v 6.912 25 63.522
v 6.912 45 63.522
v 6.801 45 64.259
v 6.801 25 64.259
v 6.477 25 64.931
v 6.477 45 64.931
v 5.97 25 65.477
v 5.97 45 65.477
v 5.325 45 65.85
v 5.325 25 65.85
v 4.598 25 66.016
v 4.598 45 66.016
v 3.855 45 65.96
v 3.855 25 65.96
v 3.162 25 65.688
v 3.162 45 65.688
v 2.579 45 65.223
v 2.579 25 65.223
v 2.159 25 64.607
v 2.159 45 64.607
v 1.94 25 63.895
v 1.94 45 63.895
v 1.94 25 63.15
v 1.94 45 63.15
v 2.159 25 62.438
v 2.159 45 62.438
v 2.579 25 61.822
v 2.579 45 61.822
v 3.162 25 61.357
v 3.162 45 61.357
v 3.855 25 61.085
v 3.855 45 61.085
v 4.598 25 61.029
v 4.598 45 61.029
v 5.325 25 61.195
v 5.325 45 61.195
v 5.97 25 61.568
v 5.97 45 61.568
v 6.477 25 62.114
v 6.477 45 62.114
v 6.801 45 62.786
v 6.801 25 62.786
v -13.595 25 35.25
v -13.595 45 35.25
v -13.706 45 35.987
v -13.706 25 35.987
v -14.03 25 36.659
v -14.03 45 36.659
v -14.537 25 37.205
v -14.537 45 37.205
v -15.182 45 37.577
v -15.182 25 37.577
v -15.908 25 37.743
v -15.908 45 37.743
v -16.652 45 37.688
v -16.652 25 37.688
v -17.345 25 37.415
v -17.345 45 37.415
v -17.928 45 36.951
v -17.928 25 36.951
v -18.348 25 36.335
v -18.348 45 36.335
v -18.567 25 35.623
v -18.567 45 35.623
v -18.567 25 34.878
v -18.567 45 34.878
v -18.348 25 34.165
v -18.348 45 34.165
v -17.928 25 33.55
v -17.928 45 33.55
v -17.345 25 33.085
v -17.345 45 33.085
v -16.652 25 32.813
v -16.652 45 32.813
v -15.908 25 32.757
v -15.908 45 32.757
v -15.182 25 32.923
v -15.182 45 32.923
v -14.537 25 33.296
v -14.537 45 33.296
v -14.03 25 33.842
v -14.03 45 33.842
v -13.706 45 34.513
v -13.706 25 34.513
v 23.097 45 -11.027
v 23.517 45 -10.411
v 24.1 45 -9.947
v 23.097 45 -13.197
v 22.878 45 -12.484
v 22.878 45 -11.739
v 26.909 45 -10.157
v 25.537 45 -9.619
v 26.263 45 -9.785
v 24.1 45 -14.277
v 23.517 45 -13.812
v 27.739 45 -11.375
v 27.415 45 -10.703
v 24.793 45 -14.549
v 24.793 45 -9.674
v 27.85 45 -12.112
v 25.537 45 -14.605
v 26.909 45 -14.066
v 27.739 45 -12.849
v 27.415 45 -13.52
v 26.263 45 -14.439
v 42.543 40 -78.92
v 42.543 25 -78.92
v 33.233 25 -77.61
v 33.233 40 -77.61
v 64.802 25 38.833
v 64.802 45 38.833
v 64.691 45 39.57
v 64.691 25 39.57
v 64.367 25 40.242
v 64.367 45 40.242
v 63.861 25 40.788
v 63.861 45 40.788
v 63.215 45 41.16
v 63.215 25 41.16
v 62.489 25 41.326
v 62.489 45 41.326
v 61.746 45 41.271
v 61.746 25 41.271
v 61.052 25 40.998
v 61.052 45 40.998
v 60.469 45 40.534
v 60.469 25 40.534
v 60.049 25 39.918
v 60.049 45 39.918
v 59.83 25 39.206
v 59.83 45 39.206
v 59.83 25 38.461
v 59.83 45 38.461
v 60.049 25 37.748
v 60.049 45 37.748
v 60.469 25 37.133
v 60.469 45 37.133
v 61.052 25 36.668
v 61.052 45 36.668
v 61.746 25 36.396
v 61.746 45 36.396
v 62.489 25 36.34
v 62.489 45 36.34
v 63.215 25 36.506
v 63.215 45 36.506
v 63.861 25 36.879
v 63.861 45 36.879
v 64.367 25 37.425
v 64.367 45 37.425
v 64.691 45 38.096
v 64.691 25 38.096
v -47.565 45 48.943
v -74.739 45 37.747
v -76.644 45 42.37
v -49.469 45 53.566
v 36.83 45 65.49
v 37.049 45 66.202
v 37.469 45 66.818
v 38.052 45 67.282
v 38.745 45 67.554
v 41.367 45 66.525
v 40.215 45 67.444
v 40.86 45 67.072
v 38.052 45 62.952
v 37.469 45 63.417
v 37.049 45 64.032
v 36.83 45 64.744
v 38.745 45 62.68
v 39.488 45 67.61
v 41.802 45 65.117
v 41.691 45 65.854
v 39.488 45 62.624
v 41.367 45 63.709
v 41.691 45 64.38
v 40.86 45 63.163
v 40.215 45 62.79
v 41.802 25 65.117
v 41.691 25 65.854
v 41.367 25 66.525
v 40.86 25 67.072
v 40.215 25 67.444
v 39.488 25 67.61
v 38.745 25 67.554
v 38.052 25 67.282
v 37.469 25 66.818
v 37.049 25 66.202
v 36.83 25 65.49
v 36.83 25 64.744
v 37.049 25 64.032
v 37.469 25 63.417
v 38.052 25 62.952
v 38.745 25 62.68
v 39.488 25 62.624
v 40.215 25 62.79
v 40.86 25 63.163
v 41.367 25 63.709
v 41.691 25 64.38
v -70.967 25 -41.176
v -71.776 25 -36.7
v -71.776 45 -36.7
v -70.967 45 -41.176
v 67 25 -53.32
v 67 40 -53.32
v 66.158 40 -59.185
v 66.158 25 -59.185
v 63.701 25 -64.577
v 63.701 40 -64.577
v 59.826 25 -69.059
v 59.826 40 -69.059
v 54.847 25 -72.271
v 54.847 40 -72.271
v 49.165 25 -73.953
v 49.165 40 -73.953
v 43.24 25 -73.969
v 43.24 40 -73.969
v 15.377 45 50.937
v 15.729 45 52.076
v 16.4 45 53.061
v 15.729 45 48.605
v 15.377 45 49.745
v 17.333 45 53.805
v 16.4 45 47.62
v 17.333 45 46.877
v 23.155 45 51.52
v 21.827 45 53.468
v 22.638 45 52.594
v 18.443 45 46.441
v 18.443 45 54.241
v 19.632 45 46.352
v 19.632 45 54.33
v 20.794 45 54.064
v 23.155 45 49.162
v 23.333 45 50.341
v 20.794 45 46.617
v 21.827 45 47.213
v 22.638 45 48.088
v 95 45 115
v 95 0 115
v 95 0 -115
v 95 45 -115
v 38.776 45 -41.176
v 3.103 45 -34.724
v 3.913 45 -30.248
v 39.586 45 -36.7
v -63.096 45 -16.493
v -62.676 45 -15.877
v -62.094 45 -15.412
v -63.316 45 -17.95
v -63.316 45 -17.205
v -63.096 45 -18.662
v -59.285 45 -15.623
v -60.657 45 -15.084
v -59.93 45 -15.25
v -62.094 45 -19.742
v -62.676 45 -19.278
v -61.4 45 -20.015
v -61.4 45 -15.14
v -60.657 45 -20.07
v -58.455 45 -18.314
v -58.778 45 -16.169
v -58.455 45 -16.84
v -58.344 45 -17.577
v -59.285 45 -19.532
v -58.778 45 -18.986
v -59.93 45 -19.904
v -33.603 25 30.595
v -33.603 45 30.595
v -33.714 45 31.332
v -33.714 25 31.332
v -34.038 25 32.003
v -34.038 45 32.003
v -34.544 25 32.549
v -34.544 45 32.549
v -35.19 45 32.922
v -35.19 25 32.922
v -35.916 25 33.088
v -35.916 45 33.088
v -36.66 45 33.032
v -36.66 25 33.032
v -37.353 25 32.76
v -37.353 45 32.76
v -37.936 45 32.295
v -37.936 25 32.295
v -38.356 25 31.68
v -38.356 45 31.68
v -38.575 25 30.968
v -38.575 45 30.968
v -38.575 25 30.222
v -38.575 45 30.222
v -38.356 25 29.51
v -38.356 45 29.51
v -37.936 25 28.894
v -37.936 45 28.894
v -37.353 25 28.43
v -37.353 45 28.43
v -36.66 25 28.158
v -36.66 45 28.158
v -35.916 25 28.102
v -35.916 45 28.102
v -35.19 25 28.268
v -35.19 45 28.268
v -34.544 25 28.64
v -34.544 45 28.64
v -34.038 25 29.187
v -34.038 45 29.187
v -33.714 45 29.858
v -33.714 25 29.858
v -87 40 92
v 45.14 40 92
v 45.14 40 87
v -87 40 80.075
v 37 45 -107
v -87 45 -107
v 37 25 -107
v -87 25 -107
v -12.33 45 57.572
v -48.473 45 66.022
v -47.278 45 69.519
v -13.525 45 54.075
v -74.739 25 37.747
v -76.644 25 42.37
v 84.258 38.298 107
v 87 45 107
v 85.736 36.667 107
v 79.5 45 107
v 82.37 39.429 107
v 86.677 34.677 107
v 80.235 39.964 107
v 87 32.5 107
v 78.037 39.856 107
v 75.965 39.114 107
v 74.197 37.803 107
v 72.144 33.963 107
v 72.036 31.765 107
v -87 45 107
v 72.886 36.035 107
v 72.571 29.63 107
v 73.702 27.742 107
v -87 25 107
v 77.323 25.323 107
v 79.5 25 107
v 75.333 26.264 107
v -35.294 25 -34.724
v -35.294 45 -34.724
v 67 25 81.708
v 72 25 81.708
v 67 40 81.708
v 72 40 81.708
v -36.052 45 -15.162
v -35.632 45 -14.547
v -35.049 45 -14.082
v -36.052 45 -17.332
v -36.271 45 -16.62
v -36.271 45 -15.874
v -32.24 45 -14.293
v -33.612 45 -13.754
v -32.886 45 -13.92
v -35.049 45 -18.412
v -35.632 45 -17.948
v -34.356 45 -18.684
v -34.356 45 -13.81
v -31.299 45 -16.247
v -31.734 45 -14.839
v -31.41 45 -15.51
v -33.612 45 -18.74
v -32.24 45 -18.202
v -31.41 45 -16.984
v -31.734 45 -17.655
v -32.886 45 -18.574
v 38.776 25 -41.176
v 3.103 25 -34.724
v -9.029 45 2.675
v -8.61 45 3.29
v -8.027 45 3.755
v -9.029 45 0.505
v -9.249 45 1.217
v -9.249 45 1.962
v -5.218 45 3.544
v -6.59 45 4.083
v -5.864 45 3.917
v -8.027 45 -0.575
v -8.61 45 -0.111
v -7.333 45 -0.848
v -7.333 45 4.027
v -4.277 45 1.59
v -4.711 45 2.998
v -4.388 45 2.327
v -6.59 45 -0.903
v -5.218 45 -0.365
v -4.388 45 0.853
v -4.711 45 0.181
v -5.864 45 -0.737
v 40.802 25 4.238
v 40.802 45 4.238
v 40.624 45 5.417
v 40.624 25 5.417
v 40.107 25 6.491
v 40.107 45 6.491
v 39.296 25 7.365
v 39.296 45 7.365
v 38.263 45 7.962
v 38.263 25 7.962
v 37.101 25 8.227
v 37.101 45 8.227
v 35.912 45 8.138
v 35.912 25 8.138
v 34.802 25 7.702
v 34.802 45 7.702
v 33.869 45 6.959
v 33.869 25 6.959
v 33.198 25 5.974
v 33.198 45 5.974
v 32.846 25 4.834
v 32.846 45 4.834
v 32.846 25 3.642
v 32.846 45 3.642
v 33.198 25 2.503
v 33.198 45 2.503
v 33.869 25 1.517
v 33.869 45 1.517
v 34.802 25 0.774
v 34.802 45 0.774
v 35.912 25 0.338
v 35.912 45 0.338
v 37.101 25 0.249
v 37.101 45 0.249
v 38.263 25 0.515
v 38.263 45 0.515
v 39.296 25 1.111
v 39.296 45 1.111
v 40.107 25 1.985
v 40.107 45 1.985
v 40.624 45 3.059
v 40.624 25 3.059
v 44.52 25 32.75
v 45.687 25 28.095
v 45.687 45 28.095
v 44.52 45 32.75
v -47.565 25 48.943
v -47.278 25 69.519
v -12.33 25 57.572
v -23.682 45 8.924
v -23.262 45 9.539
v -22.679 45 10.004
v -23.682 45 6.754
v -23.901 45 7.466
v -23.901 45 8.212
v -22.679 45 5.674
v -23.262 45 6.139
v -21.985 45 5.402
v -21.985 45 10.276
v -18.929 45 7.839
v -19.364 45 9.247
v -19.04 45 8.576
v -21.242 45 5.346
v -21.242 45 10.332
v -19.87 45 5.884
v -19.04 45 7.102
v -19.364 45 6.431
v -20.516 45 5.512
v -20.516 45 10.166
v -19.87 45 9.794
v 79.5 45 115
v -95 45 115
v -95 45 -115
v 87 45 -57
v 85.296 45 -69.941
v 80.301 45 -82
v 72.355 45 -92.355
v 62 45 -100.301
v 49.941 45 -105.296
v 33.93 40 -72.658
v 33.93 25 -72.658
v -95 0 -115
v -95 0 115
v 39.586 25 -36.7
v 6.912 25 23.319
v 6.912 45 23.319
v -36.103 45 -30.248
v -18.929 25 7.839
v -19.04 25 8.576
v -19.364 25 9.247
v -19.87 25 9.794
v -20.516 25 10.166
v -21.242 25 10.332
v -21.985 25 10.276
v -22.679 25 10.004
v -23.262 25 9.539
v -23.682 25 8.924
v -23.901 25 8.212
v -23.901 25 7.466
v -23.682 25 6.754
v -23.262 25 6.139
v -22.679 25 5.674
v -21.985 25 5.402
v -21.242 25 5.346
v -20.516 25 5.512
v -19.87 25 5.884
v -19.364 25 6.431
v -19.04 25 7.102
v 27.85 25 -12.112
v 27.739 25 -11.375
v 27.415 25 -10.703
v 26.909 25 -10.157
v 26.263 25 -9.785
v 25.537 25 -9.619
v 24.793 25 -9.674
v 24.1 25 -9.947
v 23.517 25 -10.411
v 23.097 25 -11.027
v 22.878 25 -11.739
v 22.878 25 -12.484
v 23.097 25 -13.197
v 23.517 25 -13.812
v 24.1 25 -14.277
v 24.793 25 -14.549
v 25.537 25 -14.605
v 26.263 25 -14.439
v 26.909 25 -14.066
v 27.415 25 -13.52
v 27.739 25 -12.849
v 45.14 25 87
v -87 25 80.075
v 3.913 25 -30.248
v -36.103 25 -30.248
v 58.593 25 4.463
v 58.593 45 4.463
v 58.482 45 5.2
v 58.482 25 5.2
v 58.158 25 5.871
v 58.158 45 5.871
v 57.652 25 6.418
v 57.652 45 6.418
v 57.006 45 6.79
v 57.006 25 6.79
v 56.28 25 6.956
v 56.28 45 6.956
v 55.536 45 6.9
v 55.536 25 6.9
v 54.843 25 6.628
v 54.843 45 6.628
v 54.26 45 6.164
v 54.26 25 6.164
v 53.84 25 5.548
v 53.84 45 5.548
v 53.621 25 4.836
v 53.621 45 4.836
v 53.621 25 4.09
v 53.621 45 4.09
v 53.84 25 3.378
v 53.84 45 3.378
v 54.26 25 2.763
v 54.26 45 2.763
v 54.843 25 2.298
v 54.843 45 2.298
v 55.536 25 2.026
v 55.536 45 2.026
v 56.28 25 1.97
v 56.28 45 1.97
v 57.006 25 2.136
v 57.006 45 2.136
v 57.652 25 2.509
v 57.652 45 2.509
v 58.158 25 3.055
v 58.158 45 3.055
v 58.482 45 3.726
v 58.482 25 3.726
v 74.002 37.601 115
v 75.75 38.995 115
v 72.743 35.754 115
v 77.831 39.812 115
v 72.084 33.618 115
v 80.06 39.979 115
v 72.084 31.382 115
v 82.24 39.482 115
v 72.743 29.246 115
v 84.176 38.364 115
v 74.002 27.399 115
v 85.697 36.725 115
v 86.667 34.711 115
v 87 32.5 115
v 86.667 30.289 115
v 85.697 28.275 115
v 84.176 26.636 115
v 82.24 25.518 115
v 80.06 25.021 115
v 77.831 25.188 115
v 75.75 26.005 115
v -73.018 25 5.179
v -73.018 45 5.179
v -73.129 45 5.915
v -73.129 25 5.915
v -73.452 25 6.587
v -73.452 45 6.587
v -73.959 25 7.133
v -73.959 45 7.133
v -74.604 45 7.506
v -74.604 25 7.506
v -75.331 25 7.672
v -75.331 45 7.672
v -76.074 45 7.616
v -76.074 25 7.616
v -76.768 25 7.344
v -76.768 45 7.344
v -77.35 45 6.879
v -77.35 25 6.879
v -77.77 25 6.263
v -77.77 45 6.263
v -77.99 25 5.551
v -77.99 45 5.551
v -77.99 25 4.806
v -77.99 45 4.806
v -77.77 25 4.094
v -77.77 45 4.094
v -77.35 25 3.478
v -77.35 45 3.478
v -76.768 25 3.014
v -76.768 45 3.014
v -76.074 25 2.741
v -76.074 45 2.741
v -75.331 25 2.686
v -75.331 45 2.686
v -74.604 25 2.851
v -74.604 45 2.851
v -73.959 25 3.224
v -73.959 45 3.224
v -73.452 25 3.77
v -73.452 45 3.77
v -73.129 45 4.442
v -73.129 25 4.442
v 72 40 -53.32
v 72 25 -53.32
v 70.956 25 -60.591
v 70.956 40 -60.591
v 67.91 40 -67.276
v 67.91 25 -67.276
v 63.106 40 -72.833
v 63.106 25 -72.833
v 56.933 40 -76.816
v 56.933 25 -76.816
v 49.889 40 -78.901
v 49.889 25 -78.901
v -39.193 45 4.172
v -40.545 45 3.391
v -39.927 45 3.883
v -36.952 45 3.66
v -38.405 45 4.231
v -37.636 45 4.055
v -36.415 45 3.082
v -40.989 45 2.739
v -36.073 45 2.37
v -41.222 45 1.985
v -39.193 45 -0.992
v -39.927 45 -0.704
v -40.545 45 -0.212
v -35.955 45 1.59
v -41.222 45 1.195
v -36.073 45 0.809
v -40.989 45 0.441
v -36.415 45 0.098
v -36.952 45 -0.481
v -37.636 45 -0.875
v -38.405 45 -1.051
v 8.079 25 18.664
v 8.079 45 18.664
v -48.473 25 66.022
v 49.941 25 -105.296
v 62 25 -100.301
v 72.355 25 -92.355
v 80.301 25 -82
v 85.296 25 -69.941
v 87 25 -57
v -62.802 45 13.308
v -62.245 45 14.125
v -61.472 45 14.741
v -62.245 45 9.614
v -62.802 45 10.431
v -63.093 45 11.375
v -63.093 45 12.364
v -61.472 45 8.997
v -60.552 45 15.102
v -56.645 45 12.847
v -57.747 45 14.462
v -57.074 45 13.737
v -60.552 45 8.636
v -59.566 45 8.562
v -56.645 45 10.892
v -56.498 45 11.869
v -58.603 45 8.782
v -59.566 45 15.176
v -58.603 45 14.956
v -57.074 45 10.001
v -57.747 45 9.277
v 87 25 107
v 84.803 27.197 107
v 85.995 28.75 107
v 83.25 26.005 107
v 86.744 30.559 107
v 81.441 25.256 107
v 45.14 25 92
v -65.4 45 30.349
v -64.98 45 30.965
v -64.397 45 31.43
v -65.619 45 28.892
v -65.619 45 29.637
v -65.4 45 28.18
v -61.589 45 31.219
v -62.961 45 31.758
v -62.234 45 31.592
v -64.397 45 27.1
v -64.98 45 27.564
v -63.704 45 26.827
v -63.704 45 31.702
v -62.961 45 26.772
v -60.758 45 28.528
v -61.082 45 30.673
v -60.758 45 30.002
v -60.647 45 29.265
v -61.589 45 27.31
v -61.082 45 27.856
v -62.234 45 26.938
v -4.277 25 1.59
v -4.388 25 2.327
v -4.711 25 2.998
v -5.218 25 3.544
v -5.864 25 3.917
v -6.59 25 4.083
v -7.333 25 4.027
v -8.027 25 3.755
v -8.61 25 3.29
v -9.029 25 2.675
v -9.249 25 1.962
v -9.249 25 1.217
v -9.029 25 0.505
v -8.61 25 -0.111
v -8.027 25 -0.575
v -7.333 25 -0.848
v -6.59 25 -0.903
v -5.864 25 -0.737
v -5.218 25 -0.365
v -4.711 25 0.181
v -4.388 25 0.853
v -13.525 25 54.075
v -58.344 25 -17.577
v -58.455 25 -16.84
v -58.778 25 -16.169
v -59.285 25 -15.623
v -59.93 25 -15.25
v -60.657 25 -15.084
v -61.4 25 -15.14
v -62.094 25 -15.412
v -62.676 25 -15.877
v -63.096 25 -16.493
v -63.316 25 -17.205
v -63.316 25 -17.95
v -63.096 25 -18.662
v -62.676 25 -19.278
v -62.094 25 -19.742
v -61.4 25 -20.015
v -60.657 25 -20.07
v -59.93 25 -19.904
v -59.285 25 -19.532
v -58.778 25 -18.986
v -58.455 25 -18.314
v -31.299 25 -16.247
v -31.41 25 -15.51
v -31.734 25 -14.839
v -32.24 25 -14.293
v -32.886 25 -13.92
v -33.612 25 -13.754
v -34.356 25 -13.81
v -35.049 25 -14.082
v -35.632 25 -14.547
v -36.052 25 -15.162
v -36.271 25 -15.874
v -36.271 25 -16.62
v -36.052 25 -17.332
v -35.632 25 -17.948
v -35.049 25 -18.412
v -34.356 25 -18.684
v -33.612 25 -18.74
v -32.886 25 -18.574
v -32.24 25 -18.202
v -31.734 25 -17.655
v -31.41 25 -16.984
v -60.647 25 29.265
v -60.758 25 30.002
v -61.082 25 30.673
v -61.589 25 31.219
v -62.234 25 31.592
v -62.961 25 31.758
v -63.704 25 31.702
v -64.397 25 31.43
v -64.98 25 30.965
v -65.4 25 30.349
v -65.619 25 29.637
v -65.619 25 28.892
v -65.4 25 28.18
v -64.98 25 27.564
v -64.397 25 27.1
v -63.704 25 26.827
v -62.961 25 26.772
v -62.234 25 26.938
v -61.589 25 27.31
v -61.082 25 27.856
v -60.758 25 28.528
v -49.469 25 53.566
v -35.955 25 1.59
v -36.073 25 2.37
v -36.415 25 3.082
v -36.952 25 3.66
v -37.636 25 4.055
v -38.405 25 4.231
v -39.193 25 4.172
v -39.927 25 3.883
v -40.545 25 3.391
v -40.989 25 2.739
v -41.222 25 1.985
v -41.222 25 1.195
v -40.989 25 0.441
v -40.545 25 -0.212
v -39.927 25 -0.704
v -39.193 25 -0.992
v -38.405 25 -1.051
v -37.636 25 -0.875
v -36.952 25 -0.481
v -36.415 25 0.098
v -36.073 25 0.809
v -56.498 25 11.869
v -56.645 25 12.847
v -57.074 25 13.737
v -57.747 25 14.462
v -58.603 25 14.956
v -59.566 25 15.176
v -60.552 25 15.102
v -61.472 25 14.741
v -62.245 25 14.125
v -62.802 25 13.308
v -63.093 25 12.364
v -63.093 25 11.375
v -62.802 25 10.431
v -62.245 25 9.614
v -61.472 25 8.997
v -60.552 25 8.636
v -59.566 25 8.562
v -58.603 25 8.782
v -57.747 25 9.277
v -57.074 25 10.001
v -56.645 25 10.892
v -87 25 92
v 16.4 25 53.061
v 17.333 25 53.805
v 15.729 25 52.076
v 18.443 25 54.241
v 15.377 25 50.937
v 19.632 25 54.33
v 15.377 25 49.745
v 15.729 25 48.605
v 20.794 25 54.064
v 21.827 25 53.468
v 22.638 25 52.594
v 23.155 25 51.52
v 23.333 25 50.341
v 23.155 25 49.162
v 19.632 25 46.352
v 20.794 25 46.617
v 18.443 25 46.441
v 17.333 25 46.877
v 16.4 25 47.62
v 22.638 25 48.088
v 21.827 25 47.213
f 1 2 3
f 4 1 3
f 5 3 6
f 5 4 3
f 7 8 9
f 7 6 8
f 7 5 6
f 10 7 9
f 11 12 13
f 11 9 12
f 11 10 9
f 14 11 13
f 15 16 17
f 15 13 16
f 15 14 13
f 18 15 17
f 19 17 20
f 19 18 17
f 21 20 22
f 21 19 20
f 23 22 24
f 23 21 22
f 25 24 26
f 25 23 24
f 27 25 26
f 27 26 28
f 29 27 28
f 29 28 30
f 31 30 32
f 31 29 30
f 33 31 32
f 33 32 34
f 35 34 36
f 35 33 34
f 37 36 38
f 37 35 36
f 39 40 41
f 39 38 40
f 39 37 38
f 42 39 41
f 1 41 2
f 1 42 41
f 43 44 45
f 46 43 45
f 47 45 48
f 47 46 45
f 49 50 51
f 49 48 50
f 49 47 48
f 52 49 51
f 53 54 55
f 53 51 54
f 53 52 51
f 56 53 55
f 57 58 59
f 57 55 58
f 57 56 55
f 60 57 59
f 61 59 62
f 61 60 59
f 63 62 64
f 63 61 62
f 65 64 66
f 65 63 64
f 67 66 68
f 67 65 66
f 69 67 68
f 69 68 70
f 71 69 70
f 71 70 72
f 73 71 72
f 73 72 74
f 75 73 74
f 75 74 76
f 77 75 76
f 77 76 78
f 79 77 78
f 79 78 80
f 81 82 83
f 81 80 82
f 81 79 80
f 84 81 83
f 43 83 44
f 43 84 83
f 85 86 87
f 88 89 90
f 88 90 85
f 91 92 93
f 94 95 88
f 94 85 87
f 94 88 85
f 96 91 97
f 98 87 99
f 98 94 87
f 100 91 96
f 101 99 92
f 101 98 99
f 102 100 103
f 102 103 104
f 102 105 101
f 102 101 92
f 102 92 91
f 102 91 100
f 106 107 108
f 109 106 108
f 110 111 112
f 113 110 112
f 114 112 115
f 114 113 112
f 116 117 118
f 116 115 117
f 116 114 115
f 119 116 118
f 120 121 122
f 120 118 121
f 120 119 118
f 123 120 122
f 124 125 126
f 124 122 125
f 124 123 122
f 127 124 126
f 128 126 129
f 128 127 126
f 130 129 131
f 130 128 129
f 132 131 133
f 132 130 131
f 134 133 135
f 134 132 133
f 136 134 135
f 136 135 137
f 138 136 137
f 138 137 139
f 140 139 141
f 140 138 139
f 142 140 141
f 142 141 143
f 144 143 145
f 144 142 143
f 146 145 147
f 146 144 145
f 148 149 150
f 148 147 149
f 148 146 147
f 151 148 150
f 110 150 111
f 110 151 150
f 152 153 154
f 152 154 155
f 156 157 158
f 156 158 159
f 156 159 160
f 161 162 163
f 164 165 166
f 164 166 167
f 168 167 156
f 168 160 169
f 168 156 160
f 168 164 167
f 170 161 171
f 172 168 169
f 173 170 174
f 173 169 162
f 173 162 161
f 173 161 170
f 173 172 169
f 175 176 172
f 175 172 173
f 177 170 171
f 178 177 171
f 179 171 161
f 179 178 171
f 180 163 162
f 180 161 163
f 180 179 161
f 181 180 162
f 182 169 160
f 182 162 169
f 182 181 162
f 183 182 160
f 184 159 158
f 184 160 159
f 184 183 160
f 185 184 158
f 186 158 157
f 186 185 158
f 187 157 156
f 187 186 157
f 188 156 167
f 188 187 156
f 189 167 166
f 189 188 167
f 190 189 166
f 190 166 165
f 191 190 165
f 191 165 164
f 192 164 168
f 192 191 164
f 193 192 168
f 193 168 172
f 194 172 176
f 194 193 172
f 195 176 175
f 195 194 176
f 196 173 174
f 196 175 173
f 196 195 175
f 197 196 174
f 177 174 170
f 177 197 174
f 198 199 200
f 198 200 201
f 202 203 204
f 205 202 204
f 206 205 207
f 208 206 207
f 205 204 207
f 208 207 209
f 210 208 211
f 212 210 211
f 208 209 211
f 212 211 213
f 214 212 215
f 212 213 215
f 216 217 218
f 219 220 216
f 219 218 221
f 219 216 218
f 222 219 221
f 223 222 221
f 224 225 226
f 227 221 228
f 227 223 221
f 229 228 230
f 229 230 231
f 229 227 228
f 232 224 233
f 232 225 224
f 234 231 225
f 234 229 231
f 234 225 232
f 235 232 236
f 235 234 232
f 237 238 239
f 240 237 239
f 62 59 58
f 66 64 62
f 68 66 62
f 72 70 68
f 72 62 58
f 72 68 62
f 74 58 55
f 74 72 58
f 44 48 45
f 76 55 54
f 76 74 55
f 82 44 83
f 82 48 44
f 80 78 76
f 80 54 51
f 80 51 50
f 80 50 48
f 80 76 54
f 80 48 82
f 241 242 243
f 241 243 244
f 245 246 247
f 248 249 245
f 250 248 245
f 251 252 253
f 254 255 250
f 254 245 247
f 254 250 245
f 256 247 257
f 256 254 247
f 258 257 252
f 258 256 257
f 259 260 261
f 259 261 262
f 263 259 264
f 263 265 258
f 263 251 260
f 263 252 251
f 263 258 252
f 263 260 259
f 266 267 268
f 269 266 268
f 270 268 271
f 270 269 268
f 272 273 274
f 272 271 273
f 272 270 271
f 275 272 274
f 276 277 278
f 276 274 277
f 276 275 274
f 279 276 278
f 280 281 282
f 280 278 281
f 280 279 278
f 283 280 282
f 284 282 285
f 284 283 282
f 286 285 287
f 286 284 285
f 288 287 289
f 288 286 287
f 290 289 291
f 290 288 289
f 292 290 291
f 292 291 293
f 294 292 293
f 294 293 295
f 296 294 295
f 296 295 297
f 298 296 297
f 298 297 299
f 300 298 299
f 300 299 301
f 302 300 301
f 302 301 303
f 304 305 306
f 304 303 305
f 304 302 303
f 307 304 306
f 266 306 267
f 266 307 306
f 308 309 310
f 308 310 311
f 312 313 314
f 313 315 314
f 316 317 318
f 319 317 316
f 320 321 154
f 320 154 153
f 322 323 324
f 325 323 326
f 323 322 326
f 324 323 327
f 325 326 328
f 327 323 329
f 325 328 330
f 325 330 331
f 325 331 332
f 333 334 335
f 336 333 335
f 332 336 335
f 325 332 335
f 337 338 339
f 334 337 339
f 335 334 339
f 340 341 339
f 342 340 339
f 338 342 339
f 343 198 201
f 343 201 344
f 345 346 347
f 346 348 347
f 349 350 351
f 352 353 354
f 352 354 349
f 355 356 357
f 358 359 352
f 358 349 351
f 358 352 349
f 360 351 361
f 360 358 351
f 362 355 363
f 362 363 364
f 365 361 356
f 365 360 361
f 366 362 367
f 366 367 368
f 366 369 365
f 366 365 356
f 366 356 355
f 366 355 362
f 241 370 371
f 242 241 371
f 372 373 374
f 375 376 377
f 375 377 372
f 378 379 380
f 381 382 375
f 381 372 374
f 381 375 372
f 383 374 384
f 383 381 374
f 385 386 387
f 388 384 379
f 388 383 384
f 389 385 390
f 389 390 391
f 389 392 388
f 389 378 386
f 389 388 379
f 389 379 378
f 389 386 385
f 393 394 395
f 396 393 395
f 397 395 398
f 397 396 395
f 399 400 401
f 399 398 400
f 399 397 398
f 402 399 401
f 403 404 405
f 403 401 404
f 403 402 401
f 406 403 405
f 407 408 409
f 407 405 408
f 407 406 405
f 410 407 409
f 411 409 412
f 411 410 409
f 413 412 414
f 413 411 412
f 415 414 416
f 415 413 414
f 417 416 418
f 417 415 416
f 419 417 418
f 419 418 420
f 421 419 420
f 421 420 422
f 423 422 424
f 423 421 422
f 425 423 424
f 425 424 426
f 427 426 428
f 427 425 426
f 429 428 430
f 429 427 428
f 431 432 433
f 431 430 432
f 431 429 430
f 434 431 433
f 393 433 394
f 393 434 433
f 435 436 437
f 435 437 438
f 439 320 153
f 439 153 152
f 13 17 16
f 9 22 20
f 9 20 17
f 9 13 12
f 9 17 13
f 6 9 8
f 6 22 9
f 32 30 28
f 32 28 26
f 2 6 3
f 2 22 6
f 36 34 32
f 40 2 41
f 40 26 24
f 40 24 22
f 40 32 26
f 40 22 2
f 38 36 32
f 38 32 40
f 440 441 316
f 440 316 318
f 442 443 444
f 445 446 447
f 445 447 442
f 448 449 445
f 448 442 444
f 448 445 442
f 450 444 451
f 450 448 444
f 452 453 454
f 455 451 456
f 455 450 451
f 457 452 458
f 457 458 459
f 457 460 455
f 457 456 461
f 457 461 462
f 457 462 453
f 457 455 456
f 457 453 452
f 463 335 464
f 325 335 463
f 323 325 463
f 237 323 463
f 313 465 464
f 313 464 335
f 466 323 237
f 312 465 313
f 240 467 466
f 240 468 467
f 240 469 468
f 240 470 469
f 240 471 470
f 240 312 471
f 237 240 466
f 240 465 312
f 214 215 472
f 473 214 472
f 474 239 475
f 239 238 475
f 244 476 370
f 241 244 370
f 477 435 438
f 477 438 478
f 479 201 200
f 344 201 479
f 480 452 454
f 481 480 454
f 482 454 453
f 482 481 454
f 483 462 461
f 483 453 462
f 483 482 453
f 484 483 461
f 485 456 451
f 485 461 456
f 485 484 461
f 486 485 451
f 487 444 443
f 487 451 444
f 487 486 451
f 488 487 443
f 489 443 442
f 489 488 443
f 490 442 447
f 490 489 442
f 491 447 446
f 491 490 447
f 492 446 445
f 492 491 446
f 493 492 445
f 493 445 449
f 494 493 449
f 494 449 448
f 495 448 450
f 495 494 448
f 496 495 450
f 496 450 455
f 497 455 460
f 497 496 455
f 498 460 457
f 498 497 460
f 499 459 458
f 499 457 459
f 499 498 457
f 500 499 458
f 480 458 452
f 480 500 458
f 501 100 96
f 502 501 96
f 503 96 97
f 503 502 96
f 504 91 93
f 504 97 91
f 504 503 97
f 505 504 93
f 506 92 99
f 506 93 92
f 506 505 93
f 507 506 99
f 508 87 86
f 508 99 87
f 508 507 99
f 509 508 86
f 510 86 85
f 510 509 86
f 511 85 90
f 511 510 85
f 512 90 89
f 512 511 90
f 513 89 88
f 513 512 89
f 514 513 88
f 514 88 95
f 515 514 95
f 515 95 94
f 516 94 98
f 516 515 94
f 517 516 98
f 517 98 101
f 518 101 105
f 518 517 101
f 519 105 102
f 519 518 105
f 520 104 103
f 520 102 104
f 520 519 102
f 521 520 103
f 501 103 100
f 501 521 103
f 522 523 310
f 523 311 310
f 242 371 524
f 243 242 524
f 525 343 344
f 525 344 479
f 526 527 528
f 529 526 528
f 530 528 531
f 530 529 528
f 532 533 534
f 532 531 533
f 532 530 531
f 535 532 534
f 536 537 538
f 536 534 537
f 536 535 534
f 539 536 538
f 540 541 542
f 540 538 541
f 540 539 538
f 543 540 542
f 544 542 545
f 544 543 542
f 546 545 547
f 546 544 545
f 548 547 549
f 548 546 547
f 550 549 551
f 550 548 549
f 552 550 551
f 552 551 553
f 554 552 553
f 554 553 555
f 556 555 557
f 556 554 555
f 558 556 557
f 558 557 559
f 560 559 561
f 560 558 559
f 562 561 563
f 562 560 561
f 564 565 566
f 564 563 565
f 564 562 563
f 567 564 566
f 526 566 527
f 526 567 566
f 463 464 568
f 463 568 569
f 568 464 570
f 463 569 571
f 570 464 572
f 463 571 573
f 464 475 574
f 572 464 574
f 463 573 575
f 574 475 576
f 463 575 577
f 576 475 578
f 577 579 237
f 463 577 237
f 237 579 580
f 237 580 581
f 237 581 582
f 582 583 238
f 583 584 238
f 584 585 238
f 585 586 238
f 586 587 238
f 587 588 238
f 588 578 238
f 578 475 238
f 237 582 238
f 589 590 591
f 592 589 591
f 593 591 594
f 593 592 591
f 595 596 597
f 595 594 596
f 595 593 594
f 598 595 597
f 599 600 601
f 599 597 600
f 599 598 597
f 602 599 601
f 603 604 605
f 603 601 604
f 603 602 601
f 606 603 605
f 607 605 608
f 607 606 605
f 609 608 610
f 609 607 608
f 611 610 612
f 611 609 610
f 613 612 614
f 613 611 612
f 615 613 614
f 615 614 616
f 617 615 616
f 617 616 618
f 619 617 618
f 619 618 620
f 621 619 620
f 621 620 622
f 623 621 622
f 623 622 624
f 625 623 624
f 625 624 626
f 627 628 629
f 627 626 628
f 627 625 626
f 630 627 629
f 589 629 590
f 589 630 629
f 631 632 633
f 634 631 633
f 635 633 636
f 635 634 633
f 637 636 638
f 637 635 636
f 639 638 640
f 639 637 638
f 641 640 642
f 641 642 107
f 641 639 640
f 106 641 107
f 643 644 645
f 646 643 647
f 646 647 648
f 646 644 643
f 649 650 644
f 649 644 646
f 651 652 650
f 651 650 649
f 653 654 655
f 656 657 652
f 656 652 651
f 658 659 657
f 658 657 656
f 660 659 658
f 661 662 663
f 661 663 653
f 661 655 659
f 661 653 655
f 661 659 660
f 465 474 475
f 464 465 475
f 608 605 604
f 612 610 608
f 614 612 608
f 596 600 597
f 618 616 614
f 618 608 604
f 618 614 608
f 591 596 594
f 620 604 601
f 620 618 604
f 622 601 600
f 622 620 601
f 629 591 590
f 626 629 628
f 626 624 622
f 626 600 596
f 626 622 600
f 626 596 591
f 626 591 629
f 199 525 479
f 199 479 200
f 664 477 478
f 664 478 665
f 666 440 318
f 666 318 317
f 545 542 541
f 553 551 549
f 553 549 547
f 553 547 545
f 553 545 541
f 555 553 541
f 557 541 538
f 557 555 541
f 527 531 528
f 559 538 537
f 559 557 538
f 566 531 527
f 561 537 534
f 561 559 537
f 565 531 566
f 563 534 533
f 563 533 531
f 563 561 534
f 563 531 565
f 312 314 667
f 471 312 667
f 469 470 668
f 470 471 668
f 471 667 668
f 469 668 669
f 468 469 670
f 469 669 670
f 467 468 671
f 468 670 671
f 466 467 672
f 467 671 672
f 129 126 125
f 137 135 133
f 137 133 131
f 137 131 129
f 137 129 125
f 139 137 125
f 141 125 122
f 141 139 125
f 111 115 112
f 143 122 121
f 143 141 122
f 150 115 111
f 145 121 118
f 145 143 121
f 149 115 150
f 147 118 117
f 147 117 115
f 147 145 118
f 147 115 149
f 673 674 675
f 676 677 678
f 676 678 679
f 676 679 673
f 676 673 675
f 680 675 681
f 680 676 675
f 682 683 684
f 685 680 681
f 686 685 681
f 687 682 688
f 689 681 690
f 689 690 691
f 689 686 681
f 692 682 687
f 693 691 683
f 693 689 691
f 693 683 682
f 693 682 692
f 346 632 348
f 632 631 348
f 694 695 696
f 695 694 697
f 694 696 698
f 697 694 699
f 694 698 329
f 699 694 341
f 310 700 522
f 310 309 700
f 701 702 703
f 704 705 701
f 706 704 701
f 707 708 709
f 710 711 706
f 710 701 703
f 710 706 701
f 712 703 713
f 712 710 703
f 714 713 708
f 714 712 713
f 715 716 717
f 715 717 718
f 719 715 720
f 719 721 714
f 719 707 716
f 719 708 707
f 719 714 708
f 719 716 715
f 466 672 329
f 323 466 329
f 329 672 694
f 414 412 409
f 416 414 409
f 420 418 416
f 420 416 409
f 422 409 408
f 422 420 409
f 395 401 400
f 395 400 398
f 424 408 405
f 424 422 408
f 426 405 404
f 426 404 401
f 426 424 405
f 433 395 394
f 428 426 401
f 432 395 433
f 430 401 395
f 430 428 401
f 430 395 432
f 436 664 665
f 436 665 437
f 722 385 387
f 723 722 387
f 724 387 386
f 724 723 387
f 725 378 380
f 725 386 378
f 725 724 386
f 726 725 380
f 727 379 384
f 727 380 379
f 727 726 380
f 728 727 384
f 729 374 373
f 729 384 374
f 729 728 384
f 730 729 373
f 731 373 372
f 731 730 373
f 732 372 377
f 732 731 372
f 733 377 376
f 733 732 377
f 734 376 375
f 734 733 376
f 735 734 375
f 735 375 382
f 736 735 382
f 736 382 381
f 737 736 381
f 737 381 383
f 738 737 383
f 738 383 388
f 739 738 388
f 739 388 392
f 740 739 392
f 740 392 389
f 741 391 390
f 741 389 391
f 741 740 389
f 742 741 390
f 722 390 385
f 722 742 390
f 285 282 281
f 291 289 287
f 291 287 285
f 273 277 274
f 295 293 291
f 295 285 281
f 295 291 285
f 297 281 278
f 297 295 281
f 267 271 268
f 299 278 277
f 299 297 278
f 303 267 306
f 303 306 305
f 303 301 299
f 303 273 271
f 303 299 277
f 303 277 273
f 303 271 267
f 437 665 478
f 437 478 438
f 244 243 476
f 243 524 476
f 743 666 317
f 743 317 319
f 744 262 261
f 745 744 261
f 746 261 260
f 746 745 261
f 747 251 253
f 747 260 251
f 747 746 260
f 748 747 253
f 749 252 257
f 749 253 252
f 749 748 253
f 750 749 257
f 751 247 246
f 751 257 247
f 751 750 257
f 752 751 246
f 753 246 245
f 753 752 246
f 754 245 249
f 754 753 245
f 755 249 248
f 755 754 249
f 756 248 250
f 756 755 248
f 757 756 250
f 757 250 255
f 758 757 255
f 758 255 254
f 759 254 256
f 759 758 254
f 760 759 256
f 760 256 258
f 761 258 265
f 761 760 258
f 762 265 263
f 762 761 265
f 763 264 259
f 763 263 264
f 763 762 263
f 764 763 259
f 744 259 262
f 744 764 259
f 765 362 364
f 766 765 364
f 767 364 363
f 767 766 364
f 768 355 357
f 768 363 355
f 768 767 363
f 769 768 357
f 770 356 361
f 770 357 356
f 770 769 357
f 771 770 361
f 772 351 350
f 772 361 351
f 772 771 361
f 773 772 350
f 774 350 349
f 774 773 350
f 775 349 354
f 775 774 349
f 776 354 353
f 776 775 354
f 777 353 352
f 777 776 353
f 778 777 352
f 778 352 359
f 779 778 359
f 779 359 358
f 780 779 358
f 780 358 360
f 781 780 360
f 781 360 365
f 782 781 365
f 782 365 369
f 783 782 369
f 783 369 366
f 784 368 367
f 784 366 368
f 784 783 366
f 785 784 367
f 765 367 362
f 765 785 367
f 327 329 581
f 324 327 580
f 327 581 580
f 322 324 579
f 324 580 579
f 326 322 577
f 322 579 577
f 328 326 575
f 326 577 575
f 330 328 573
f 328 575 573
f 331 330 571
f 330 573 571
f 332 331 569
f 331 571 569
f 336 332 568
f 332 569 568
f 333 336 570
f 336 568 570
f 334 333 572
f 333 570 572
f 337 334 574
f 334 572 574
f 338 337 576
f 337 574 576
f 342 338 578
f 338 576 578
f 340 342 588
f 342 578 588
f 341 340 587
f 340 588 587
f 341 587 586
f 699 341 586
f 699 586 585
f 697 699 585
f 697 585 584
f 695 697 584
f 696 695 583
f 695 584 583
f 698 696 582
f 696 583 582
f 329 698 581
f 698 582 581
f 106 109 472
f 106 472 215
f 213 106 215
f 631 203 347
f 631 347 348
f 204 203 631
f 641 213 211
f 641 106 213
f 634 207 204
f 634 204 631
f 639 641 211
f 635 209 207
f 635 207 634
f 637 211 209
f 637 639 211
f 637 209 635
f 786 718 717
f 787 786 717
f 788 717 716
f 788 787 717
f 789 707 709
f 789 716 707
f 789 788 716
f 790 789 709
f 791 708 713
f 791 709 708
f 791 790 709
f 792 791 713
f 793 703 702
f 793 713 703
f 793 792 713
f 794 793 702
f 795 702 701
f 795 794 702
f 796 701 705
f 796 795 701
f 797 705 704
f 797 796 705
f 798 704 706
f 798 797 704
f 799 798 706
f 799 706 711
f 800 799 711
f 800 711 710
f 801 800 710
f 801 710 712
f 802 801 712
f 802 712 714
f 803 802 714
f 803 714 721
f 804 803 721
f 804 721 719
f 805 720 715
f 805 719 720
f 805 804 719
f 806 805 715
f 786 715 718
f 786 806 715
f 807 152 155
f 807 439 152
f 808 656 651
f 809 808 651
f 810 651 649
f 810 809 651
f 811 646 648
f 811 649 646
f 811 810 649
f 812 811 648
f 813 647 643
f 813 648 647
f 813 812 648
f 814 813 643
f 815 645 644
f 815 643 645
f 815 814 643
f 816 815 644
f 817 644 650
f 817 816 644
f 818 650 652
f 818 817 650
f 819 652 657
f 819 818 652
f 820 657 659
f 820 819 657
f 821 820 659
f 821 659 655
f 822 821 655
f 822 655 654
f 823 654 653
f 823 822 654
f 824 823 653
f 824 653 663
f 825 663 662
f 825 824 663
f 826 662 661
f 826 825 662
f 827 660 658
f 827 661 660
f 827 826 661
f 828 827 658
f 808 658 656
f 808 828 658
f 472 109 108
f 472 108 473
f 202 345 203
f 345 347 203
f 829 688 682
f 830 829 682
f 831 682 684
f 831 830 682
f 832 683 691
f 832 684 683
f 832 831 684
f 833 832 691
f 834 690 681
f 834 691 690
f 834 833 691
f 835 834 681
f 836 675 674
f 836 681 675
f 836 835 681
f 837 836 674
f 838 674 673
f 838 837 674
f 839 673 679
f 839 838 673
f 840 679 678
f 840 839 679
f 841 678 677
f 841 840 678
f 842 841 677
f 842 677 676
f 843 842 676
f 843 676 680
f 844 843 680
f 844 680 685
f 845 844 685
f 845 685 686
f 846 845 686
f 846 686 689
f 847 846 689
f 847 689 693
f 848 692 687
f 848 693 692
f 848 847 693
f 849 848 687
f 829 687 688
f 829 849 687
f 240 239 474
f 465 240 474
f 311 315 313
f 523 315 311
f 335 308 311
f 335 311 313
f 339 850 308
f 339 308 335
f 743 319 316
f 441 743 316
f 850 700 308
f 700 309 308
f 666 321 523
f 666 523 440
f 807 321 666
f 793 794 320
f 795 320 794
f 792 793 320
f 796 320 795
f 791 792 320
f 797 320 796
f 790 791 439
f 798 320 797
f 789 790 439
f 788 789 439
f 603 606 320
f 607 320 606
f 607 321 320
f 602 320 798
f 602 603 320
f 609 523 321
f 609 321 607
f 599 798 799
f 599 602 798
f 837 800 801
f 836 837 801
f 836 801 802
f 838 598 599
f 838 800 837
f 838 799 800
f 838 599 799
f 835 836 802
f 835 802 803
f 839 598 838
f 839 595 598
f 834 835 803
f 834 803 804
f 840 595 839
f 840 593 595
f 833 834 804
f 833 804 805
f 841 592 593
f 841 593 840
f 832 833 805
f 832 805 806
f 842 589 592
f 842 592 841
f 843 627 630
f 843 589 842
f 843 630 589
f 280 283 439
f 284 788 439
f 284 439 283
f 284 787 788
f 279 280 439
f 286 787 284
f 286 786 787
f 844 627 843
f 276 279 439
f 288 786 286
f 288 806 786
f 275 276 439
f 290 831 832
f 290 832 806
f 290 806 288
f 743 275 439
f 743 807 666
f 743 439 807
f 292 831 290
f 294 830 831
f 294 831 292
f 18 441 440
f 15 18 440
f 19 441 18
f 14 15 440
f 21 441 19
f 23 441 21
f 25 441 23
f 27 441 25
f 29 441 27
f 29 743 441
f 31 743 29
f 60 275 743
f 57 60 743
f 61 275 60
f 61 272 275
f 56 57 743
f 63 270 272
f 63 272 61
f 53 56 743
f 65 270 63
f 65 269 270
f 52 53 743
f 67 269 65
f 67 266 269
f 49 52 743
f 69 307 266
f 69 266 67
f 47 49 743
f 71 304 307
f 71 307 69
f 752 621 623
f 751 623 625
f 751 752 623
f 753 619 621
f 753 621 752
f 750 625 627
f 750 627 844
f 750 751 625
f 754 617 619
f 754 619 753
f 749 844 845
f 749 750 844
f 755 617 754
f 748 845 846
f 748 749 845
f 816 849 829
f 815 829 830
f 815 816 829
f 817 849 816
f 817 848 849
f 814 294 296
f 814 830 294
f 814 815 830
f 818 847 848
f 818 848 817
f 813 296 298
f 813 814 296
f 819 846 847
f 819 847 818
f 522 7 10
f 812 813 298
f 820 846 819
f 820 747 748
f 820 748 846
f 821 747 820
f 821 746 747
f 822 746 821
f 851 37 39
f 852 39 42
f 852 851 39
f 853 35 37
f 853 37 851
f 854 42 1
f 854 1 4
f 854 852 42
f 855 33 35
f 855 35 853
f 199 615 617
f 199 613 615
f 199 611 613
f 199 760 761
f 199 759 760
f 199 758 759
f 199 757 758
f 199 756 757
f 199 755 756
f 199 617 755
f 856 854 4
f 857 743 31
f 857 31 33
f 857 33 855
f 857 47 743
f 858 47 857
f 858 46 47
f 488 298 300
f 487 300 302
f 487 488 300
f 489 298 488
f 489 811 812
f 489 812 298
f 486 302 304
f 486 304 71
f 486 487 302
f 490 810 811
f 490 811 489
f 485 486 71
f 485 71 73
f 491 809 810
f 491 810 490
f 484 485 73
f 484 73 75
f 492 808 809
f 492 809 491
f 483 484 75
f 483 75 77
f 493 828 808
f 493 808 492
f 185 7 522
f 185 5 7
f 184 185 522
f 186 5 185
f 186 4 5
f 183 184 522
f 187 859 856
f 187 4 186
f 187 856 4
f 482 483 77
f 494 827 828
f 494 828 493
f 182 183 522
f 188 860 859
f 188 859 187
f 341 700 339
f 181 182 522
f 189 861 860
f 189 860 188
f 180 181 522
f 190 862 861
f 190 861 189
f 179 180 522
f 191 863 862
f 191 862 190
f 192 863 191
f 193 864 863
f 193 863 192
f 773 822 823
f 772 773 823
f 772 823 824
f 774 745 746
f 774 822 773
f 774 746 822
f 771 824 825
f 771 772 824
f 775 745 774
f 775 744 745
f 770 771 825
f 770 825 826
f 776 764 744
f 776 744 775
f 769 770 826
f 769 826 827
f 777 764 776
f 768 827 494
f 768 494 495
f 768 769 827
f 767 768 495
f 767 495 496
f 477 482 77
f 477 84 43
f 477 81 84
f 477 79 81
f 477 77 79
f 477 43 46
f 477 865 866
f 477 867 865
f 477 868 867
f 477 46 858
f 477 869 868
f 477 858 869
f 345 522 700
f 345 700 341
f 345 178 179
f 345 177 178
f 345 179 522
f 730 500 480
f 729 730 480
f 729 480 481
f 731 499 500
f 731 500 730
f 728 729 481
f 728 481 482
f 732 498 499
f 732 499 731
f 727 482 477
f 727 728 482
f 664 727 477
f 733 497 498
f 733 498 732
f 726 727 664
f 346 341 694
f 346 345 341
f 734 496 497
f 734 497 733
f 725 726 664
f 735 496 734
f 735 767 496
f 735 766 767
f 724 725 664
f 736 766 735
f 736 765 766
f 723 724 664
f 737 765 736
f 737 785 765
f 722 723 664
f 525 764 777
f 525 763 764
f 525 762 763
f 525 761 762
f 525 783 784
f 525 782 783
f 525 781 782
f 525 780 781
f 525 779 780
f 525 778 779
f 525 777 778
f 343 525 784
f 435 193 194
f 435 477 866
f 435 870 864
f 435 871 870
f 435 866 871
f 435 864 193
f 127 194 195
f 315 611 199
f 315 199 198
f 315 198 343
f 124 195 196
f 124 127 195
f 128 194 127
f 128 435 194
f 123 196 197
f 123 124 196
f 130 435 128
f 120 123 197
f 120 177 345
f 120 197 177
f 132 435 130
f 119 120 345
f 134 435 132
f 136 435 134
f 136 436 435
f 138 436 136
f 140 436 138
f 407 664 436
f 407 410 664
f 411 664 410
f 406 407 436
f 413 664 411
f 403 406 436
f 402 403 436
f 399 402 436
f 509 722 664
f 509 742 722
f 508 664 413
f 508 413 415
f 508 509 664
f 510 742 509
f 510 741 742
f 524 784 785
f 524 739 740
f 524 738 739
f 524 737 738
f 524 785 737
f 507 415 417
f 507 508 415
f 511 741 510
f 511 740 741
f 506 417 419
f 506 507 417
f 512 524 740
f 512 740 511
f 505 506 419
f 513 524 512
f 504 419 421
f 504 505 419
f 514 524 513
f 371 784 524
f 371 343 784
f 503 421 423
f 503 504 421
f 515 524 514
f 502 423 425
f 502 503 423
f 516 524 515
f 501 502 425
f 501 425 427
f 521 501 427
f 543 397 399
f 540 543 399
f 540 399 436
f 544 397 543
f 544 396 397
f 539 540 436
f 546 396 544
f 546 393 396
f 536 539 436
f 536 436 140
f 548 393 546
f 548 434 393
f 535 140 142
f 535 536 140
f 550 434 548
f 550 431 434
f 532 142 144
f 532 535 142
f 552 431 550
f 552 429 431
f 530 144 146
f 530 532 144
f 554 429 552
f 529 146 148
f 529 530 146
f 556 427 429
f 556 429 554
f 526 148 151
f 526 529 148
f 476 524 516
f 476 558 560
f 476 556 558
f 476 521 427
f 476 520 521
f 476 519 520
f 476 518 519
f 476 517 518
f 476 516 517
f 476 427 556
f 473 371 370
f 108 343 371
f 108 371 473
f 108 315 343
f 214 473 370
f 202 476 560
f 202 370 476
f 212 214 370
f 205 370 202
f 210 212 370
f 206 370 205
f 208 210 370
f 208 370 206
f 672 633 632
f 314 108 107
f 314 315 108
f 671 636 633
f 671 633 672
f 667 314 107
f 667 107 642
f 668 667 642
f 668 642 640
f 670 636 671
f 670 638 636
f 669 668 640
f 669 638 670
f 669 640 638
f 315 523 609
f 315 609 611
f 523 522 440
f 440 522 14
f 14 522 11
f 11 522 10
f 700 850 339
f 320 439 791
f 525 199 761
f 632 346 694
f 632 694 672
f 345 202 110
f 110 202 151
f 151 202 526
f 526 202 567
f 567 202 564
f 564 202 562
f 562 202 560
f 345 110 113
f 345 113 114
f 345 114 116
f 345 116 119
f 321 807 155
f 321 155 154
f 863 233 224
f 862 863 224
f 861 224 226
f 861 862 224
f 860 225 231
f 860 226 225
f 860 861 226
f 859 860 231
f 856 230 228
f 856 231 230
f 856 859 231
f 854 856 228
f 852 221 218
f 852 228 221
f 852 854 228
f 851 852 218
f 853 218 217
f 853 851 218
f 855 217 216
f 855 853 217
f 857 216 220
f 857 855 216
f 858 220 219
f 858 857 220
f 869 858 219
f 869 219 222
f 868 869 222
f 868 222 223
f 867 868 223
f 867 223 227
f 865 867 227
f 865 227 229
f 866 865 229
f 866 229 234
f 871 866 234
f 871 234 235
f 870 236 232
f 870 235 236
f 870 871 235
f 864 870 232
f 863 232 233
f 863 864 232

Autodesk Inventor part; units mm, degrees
ref_plane "YZ Plane" through (0, 0, 0) normal (1, 0, 0) x (0, 1, 0)
ref_plane "XZ Plane" through (0, 0, 0) normal (0, 1, 0) x (-1, 0, 0)
ref_plane "XY Plane" through (0, 0, 0) normal (0, 0, 1) x (1, 0, 0)
sketch "草圖1" plane through (0, 0, 0) normal (0, 1, 0) x (-1, 0, 0)
  line L0 (133, 0) -> (-133, 0) construction
  line L1 (0, -161) -> (0, 161) construction
  line L2 (95, -115) -> (-95, -115)
  line L3 (-95, -115) -> (-95, 115)
  line L4 (-95, 115) -> (95, 115)
  line L5 (95, 115) -> (95, -115)
  point P0 (0, 0)
  dimension "d0" = 190
  dimension "d1" = 230
extrude "擠出1" add sketch "草圖1" along normal blind 40
sketch "草圖3" plane through (0, 0, 0) normal (1, 0, 0) x (0, 1, 0)
  line L0 (0, 115) -> (0, -115) construction
  line L1 (0, 115) -> (40, 115) construction
  line L2 (40, -115) -> (40, 115) construction
  line L3 (0, -115) -> (40, -115) construction
  line L4 (-8, 0) -> (48, 0) construction
  line L5 (0, -161) -> (0, 161) construction
  line L6 (10, 107) -> (40, 107)
  line L7 (40, 107) -> (40, -107)
  line L8 (40, -107) -> (10, -107)
  line L9 (10, 107) -> (10, -107.0049)
  point P0 (0, 0)
  dimension "d13" = 8
  dimension "d14" = 8
  dimension "d27" = 10
sketch "草圖2" plane through (0, 40, 0) normal (0, 1, 0) x (1, 0, 0)
  line L0 (95, 115) -> (-95, 115) construction
  line L1 (-95, 115) -> (-95, -115) construction
  line L2 (-95, -115) -> (95, -115) construction
  line L3 (95, -115) -> (95, 115) construction
  line L4 (-133, 0) -> (133, 0) construction
  line L5 (0, 161) -> (0, -161) construction
  line L6 (-87, 107) -> (87, 107)
  line L7 (87, 107) -> (87, -107)
  line L8 (87, -107) -> (-87, -107)
  line L9 (-87, -107) -> (-87, 107)
  line L10 (-87, -80.0748) -> (45.1402, -87)
  line L11 (45.1402, -92) -> (-87, -92)
  line L12 (45.1402, -92) -> (45.1402, -87)
  line L13 (72, 53.3199) -> (72, -81.708)
  line L14 (72, -81.708) -> (67, -81.708)
  line L15 (67, -81.708) -> (67, 53.3199)
  arc A0 (67, 53.3199) -> (43.2398, 73.9691) centre (46.1471, 53.3199) ccw
  arc A1 (72, 53.3199) -> (42.5427, 78.9203) centre (46.1471, 53.3199) ccw
  line L16 (43.2398, 73.9691) -> (33.9304, 72.6584)
  line L17 (45.4216, 79.3256) -> (33.2333, 77.6096)
  line L18 (33.2333, 77.6096) -> (33.9304, 72.6584)
  point P0 (0, 0)
  dimension "d4" = 8
  dimension "d5" = 15
  dimension "d6" = 5
  dimension "d7" = 3
  dimension "d8" = 15
  dimension "d9" = 5
  dimension "d10" = 5
extrude "擠出7" cut sketch "草圖3" along normal mid plane 174
extrude "擠出8" add sketch "草圖2" against normal up to next contours L10 L12 L11 L9 | L13 L14 L15 A0 L16 L18 L17 A1
sketch "草圖6" plane through (-87, 10, 107) normal (0, 1, 0) x (1, 0, 0)
  line L0 (132.1402, 15) -> (0, 15) projected
  line L1 (0, 15) -> (0, 0) projected
  line L2 (0, 0) -> (174, 0) projected
  line L3 (174, 0) -> (174, 214) projected
  line L4 (0, 214) -> (174, 214) projected
  line L5 (0, 214) -> (0, 26.9252) projected
  line L6 (0, 26.9252) -> (132.1402, 20) projected
  line L7 (132.1402, 20) -> (132.1402, 15) projected
  arc A0 (159, 160.3199) -> (129.5427, 185.9203) centre (133.1471, 160.3199) ccw projected
  line L8 (159, 160.3199) -> (159, 25.292) projected
  line L9 (159, 25.292) -> (154, 25.292) projected
  line L10 (154, 25.292) -> (154, 160.3199) projected
  arc A1 (154, 160.3199) -> (130.2398, 180.9691) centre (133.1471, 160.3199) ccw projected
  line L11 (130.2398, 180.9691) -> (120.9304, 179.6584) projected
  line L12 (120.9304, 179.6584) -> (120.2333, 184.6096) projected
  line L13 (120.2333, 184.6096) -> (129.5427, 185.9203) projected
  point P0 (87, 107)
extrude "擠出9" add sketch "草圖6" along normal blind 15
sketch "草圖9" plane through (-95, 0, 115) normal (0, 0, 1) x (1, 0, 0)
  line L0 (182, 25) -> (8, 25) construction
  line L1 (182, 40) -> (182, 25) construction
  line L2 (167, 40) -> (167, 25) construction
  circle A0 centre (174.5, 32.5) radius 7.5
  point P0 (95, 0)
  dimension "d64" = 15
extrude "擠出11" cut sketch "草圖9" against normal blind 20
sketch "草圖10" plane through (0, 40, 0) normal (0, 1, 0) x (1, 0, 0)
  line L0 (-87, -92) -> (45.1402, -92) construction
  line L1 (45.1402, -92) -> (45.1402, -87) construction
  line L2 (45.1402, -87) -> (-87, -80.0748) construction
  line L3 (-87, -80.0748) -> (-87, 107) projected
  line L4 (-87, 107) -> (87, 107) projected
  line L5 (87, 107) -> (87, -107) projected
  line L6 (87, -107) -> (79.5, -107) projected
  line L7 (79.5, -115) -> (79.5, -107) projected
  line L8 (79.5, -115) -> (95, -115) projected
  line L9 (95, -115) -> (95, 115) projected
  line L10 (95, 115) -> (-95, 115) projected
  line L11 (-95, 115) -> (-95, -115) projected
  line L12 (-95, -115) -> (79.5, -115) projected
  line L13 (79.5, -107) -> (-87, -107) projected
  line L14 (-87, -107) -> (-87, -92) projected
  line L15 (-87, -80.0748) -> (-87, -92)
  point P0 (0, 0)
extrude "擠出12" add sketch "草圖10" along normal blind 5
fillet "圓角1" radius 50 1 edges at (87, 35, -107)
sketch "草圖11" plane through (-87, 25, 107) normal (0, 1, 0) x (1, 0, 0)
  line L0 (16.0333, 148.1759) -> (51.7064, 141.7244)
  line L1 (51.7064, 141.7244) -> (50.8968, 137.2481)
  line L2 (50.8968, 137.2481) -> (15.2237, 143.6996)
  line L3 (15.2237, 143.6996) -> (16.0333, 148.1759)
  line L4 (182, 222) -> (-8, 222) projected
  line L5 (70.9047, 222) -> (70.9047, 192.887) construction
  line L6 (125.7761, 148.1759) -> (90.103, 141.7244)
  line L7 (90.103, 141.7244) -> (90.9126, 137.2481)
  line L8 (90.9126, 137.2481) -> (126.5857, 143.6996)
  line L9 (126.5857, 143.6996) -> (125.7761, 148.1759)
  circle A0 centre (26.1565, 124.5773) radius 2.5
  circle A1 centre (11.4824, 101.8214) radius 2.5
  circle A2 centre (23.8526, 77.7353) radius 2.5
  circle A3 centre (50.8968, 76.4051) radius 2.5
  circle A4 centre (65.5709, 99.161) radius 2.5
  circle A5 centre (53.2008, 123.2471) radius 2.5
  circle A6 centre (126.3016, 41.8829) radius 2.5
  circle A7 centre (149.3019, 68.1668) radius 2.5
  circle A8 centre (143.0928, 102.5369) radius 2.5
  circle A9 centre (112.3498, 119.1118) radius 2.5
  circle A10 centre (80.2231, 105.4102) radius 2.5
  circle A11 centre (70.9047, 71.7498) radius 2.5
  circle A12 centre (91.4116, 43.4775) radius 2.5
  line L10 (95.0789, 88.3359) -> (132.687, 78.9051)
  line L11 (132.687, 78.9051) -> (131.5197, 74.2498)
  line L12 (131.5197, 74.2498) -> (93.9116, 83.6806)
  line L13 (93.9116, 83.6806) -> (95.0789, 88.3359)
  line L14 (38.5267, 40.9775) -> (73.475, 52.9247)
  line L15 (73.475, 52.9247) -> (74.6702, 49.4284)
  line L16 (74.6702, 49.4284) -> (39.7219, 37.4812)
  line L17 (39.7219, 37.4812) -> (38.5267, 40.9775)
  line L18 (12.2608, 69.2526) -> (39.4354, 58.057)
  line L19 (39.4354, 58.057) -> (37.5308, 53.434)
  line L20 (37.5308, 53.434) -> (10.3562, 64.6295)
  line L21 (10.3562, 64.6295) -> (12.2608, 69.2526)
  circle A13 centre (106.3327, 56.6592) radius 4
  circle A14 centre (123.8016, 102.7619) radius 4
  circle A15 centre (27.1857, 95.1306) radius 3.3162
  circle A16 centre (48.3968, 105.4102) radius 2.6483
  point P0 (38.5267, 100.4912)
  point P1 (110.5122, 78.9051)
  dimension "d70" = 5
  dimension "d73" = 360
  dimension "d75" = 5
  dimension "d78" = 360
  dimension "d80" = 5
  dimension "d81" = 8
  dimension "d82" = 8
extrude "擠出13" add sketch "草圖11" along normal up to surface (20 mm away)
properties part number "ball"
